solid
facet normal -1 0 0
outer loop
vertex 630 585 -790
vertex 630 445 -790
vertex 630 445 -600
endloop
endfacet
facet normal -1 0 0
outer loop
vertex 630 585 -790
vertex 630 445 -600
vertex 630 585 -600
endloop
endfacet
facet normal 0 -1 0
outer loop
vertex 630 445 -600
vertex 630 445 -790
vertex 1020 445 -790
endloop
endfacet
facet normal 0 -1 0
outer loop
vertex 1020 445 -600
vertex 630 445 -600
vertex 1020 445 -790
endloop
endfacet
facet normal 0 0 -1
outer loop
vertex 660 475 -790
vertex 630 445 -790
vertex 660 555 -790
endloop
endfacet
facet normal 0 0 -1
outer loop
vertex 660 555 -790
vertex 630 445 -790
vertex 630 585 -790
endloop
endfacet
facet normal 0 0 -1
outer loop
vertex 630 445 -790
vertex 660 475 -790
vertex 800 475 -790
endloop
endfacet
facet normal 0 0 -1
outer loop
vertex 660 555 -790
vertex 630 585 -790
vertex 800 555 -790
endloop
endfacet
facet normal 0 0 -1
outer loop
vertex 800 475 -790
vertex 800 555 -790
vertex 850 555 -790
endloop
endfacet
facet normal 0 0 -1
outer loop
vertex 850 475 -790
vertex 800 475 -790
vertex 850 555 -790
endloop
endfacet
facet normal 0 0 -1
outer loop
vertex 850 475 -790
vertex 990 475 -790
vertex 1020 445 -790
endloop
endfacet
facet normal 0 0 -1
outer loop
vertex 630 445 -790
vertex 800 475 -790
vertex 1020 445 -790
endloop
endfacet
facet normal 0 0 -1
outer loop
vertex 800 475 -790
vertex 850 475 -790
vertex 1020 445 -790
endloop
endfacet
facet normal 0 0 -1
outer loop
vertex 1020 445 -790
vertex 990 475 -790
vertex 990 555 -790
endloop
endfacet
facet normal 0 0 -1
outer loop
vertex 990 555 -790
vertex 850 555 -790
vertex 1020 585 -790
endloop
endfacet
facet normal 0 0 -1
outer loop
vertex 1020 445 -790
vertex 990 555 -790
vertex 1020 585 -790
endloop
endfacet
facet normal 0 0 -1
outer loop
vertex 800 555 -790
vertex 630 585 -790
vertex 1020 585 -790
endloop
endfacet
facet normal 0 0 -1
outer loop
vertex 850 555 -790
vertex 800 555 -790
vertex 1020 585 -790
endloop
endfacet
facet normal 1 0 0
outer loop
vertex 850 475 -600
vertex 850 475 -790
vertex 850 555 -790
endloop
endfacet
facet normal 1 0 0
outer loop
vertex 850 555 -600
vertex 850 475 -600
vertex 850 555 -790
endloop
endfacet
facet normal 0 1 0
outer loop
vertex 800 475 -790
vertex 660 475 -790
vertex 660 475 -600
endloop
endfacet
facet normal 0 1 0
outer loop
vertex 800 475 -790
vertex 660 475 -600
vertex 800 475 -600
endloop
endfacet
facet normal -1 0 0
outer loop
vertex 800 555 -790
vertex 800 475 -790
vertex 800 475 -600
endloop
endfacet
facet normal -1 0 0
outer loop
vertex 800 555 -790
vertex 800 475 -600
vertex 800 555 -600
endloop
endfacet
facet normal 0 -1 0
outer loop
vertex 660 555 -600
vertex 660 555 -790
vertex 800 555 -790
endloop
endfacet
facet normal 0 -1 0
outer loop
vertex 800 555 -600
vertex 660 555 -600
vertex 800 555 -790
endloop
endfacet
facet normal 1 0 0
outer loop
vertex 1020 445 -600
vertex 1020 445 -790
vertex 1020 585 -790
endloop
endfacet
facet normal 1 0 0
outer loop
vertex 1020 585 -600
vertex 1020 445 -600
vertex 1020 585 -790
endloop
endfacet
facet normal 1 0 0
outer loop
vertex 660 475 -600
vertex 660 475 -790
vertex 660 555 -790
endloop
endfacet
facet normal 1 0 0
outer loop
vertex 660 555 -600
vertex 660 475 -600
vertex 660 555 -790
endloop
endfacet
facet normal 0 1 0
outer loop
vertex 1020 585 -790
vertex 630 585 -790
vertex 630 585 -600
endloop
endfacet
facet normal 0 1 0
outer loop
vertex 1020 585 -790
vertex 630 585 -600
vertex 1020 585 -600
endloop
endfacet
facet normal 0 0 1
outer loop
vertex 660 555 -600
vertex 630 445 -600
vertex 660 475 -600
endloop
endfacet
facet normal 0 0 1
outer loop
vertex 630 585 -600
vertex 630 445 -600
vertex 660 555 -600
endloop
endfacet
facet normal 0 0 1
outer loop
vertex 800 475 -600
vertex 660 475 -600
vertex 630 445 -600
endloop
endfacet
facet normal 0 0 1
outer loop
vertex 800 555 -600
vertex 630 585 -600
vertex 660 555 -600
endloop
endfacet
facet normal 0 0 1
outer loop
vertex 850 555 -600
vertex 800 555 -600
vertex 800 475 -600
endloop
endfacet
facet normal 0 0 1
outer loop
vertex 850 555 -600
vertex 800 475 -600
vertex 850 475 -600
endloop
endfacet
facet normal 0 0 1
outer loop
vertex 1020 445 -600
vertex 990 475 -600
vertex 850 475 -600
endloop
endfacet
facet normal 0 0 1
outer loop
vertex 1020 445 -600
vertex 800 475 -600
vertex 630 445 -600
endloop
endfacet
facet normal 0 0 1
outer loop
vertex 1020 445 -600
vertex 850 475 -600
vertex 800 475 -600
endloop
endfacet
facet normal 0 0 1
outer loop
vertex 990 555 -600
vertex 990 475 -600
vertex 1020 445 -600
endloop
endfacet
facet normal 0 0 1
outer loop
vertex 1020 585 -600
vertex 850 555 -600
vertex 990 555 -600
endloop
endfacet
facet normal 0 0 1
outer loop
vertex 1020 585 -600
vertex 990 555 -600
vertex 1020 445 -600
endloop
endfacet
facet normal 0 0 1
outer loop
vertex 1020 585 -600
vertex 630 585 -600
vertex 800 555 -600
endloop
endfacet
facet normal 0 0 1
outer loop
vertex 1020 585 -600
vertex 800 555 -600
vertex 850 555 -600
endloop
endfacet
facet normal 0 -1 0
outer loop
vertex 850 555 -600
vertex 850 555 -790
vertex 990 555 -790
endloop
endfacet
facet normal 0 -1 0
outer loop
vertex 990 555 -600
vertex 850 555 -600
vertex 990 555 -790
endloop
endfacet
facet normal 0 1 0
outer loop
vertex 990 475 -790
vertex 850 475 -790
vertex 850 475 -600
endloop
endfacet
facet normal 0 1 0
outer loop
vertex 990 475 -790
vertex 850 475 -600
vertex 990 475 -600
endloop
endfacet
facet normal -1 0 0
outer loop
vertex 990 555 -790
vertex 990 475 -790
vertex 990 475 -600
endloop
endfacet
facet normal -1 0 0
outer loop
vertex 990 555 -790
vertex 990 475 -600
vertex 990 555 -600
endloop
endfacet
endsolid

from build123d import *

# Parameters (mm, degrees)
BOX035_W     = 140
BOX035_H     = 80
BOX035_DEPTH = 190
BOX036_W     = 140
BOX036_H     = 80
BOX036_DEPTH = 190
BOX037_W     = 390
BOX037_H     = 140
BOX037_DEPTH = 190


with BuildPart() as cube025:
    # Box035 → Box035 (new body)
    with BuildSketch(Plane(origin=(220, 30, 0), x_dir=(1, 0, 0), z_dir=(0, 0, 1))):
        with Locations((70, 40)):
            Rectangle(BOX035_W, BOX035_H)
    extrude(amount=BOX035_DEPTH)


with BuildPart() as fusion011:
    # Box036 → Box036 (new body)
    with BuildSketch(Plane(origin=(30, 30, 0), x_dir=(1, 0, 0), z_dir=(0, 0, 1))):
        with Locations((70, 40)):
            Rectangle(BOX036_W, BOX036_H)
    extrude(amount=BOX036_DEPTH)

    # Fusion011: union Cube025
    add(cube025.part)


with BuildPart() as cut008:
    # Box037 → Box037 (new body)
    with BuildSketch(Plane.XY):
        with Locations((195, 70)):
            Rectangle(BOX037_W, BOX037_H)
    extrude(amount=BOX037_DEPTH)

    # Cut008: cut Fusion011
    add(fusion011.part, mode=Mode.SUBTRACT)


with BuildPart() as cut008_1:
    # Cut008 placement: moved
    add(cut008.part.moved(Location((630, 445, -790))))


solid = cut008_1.part
